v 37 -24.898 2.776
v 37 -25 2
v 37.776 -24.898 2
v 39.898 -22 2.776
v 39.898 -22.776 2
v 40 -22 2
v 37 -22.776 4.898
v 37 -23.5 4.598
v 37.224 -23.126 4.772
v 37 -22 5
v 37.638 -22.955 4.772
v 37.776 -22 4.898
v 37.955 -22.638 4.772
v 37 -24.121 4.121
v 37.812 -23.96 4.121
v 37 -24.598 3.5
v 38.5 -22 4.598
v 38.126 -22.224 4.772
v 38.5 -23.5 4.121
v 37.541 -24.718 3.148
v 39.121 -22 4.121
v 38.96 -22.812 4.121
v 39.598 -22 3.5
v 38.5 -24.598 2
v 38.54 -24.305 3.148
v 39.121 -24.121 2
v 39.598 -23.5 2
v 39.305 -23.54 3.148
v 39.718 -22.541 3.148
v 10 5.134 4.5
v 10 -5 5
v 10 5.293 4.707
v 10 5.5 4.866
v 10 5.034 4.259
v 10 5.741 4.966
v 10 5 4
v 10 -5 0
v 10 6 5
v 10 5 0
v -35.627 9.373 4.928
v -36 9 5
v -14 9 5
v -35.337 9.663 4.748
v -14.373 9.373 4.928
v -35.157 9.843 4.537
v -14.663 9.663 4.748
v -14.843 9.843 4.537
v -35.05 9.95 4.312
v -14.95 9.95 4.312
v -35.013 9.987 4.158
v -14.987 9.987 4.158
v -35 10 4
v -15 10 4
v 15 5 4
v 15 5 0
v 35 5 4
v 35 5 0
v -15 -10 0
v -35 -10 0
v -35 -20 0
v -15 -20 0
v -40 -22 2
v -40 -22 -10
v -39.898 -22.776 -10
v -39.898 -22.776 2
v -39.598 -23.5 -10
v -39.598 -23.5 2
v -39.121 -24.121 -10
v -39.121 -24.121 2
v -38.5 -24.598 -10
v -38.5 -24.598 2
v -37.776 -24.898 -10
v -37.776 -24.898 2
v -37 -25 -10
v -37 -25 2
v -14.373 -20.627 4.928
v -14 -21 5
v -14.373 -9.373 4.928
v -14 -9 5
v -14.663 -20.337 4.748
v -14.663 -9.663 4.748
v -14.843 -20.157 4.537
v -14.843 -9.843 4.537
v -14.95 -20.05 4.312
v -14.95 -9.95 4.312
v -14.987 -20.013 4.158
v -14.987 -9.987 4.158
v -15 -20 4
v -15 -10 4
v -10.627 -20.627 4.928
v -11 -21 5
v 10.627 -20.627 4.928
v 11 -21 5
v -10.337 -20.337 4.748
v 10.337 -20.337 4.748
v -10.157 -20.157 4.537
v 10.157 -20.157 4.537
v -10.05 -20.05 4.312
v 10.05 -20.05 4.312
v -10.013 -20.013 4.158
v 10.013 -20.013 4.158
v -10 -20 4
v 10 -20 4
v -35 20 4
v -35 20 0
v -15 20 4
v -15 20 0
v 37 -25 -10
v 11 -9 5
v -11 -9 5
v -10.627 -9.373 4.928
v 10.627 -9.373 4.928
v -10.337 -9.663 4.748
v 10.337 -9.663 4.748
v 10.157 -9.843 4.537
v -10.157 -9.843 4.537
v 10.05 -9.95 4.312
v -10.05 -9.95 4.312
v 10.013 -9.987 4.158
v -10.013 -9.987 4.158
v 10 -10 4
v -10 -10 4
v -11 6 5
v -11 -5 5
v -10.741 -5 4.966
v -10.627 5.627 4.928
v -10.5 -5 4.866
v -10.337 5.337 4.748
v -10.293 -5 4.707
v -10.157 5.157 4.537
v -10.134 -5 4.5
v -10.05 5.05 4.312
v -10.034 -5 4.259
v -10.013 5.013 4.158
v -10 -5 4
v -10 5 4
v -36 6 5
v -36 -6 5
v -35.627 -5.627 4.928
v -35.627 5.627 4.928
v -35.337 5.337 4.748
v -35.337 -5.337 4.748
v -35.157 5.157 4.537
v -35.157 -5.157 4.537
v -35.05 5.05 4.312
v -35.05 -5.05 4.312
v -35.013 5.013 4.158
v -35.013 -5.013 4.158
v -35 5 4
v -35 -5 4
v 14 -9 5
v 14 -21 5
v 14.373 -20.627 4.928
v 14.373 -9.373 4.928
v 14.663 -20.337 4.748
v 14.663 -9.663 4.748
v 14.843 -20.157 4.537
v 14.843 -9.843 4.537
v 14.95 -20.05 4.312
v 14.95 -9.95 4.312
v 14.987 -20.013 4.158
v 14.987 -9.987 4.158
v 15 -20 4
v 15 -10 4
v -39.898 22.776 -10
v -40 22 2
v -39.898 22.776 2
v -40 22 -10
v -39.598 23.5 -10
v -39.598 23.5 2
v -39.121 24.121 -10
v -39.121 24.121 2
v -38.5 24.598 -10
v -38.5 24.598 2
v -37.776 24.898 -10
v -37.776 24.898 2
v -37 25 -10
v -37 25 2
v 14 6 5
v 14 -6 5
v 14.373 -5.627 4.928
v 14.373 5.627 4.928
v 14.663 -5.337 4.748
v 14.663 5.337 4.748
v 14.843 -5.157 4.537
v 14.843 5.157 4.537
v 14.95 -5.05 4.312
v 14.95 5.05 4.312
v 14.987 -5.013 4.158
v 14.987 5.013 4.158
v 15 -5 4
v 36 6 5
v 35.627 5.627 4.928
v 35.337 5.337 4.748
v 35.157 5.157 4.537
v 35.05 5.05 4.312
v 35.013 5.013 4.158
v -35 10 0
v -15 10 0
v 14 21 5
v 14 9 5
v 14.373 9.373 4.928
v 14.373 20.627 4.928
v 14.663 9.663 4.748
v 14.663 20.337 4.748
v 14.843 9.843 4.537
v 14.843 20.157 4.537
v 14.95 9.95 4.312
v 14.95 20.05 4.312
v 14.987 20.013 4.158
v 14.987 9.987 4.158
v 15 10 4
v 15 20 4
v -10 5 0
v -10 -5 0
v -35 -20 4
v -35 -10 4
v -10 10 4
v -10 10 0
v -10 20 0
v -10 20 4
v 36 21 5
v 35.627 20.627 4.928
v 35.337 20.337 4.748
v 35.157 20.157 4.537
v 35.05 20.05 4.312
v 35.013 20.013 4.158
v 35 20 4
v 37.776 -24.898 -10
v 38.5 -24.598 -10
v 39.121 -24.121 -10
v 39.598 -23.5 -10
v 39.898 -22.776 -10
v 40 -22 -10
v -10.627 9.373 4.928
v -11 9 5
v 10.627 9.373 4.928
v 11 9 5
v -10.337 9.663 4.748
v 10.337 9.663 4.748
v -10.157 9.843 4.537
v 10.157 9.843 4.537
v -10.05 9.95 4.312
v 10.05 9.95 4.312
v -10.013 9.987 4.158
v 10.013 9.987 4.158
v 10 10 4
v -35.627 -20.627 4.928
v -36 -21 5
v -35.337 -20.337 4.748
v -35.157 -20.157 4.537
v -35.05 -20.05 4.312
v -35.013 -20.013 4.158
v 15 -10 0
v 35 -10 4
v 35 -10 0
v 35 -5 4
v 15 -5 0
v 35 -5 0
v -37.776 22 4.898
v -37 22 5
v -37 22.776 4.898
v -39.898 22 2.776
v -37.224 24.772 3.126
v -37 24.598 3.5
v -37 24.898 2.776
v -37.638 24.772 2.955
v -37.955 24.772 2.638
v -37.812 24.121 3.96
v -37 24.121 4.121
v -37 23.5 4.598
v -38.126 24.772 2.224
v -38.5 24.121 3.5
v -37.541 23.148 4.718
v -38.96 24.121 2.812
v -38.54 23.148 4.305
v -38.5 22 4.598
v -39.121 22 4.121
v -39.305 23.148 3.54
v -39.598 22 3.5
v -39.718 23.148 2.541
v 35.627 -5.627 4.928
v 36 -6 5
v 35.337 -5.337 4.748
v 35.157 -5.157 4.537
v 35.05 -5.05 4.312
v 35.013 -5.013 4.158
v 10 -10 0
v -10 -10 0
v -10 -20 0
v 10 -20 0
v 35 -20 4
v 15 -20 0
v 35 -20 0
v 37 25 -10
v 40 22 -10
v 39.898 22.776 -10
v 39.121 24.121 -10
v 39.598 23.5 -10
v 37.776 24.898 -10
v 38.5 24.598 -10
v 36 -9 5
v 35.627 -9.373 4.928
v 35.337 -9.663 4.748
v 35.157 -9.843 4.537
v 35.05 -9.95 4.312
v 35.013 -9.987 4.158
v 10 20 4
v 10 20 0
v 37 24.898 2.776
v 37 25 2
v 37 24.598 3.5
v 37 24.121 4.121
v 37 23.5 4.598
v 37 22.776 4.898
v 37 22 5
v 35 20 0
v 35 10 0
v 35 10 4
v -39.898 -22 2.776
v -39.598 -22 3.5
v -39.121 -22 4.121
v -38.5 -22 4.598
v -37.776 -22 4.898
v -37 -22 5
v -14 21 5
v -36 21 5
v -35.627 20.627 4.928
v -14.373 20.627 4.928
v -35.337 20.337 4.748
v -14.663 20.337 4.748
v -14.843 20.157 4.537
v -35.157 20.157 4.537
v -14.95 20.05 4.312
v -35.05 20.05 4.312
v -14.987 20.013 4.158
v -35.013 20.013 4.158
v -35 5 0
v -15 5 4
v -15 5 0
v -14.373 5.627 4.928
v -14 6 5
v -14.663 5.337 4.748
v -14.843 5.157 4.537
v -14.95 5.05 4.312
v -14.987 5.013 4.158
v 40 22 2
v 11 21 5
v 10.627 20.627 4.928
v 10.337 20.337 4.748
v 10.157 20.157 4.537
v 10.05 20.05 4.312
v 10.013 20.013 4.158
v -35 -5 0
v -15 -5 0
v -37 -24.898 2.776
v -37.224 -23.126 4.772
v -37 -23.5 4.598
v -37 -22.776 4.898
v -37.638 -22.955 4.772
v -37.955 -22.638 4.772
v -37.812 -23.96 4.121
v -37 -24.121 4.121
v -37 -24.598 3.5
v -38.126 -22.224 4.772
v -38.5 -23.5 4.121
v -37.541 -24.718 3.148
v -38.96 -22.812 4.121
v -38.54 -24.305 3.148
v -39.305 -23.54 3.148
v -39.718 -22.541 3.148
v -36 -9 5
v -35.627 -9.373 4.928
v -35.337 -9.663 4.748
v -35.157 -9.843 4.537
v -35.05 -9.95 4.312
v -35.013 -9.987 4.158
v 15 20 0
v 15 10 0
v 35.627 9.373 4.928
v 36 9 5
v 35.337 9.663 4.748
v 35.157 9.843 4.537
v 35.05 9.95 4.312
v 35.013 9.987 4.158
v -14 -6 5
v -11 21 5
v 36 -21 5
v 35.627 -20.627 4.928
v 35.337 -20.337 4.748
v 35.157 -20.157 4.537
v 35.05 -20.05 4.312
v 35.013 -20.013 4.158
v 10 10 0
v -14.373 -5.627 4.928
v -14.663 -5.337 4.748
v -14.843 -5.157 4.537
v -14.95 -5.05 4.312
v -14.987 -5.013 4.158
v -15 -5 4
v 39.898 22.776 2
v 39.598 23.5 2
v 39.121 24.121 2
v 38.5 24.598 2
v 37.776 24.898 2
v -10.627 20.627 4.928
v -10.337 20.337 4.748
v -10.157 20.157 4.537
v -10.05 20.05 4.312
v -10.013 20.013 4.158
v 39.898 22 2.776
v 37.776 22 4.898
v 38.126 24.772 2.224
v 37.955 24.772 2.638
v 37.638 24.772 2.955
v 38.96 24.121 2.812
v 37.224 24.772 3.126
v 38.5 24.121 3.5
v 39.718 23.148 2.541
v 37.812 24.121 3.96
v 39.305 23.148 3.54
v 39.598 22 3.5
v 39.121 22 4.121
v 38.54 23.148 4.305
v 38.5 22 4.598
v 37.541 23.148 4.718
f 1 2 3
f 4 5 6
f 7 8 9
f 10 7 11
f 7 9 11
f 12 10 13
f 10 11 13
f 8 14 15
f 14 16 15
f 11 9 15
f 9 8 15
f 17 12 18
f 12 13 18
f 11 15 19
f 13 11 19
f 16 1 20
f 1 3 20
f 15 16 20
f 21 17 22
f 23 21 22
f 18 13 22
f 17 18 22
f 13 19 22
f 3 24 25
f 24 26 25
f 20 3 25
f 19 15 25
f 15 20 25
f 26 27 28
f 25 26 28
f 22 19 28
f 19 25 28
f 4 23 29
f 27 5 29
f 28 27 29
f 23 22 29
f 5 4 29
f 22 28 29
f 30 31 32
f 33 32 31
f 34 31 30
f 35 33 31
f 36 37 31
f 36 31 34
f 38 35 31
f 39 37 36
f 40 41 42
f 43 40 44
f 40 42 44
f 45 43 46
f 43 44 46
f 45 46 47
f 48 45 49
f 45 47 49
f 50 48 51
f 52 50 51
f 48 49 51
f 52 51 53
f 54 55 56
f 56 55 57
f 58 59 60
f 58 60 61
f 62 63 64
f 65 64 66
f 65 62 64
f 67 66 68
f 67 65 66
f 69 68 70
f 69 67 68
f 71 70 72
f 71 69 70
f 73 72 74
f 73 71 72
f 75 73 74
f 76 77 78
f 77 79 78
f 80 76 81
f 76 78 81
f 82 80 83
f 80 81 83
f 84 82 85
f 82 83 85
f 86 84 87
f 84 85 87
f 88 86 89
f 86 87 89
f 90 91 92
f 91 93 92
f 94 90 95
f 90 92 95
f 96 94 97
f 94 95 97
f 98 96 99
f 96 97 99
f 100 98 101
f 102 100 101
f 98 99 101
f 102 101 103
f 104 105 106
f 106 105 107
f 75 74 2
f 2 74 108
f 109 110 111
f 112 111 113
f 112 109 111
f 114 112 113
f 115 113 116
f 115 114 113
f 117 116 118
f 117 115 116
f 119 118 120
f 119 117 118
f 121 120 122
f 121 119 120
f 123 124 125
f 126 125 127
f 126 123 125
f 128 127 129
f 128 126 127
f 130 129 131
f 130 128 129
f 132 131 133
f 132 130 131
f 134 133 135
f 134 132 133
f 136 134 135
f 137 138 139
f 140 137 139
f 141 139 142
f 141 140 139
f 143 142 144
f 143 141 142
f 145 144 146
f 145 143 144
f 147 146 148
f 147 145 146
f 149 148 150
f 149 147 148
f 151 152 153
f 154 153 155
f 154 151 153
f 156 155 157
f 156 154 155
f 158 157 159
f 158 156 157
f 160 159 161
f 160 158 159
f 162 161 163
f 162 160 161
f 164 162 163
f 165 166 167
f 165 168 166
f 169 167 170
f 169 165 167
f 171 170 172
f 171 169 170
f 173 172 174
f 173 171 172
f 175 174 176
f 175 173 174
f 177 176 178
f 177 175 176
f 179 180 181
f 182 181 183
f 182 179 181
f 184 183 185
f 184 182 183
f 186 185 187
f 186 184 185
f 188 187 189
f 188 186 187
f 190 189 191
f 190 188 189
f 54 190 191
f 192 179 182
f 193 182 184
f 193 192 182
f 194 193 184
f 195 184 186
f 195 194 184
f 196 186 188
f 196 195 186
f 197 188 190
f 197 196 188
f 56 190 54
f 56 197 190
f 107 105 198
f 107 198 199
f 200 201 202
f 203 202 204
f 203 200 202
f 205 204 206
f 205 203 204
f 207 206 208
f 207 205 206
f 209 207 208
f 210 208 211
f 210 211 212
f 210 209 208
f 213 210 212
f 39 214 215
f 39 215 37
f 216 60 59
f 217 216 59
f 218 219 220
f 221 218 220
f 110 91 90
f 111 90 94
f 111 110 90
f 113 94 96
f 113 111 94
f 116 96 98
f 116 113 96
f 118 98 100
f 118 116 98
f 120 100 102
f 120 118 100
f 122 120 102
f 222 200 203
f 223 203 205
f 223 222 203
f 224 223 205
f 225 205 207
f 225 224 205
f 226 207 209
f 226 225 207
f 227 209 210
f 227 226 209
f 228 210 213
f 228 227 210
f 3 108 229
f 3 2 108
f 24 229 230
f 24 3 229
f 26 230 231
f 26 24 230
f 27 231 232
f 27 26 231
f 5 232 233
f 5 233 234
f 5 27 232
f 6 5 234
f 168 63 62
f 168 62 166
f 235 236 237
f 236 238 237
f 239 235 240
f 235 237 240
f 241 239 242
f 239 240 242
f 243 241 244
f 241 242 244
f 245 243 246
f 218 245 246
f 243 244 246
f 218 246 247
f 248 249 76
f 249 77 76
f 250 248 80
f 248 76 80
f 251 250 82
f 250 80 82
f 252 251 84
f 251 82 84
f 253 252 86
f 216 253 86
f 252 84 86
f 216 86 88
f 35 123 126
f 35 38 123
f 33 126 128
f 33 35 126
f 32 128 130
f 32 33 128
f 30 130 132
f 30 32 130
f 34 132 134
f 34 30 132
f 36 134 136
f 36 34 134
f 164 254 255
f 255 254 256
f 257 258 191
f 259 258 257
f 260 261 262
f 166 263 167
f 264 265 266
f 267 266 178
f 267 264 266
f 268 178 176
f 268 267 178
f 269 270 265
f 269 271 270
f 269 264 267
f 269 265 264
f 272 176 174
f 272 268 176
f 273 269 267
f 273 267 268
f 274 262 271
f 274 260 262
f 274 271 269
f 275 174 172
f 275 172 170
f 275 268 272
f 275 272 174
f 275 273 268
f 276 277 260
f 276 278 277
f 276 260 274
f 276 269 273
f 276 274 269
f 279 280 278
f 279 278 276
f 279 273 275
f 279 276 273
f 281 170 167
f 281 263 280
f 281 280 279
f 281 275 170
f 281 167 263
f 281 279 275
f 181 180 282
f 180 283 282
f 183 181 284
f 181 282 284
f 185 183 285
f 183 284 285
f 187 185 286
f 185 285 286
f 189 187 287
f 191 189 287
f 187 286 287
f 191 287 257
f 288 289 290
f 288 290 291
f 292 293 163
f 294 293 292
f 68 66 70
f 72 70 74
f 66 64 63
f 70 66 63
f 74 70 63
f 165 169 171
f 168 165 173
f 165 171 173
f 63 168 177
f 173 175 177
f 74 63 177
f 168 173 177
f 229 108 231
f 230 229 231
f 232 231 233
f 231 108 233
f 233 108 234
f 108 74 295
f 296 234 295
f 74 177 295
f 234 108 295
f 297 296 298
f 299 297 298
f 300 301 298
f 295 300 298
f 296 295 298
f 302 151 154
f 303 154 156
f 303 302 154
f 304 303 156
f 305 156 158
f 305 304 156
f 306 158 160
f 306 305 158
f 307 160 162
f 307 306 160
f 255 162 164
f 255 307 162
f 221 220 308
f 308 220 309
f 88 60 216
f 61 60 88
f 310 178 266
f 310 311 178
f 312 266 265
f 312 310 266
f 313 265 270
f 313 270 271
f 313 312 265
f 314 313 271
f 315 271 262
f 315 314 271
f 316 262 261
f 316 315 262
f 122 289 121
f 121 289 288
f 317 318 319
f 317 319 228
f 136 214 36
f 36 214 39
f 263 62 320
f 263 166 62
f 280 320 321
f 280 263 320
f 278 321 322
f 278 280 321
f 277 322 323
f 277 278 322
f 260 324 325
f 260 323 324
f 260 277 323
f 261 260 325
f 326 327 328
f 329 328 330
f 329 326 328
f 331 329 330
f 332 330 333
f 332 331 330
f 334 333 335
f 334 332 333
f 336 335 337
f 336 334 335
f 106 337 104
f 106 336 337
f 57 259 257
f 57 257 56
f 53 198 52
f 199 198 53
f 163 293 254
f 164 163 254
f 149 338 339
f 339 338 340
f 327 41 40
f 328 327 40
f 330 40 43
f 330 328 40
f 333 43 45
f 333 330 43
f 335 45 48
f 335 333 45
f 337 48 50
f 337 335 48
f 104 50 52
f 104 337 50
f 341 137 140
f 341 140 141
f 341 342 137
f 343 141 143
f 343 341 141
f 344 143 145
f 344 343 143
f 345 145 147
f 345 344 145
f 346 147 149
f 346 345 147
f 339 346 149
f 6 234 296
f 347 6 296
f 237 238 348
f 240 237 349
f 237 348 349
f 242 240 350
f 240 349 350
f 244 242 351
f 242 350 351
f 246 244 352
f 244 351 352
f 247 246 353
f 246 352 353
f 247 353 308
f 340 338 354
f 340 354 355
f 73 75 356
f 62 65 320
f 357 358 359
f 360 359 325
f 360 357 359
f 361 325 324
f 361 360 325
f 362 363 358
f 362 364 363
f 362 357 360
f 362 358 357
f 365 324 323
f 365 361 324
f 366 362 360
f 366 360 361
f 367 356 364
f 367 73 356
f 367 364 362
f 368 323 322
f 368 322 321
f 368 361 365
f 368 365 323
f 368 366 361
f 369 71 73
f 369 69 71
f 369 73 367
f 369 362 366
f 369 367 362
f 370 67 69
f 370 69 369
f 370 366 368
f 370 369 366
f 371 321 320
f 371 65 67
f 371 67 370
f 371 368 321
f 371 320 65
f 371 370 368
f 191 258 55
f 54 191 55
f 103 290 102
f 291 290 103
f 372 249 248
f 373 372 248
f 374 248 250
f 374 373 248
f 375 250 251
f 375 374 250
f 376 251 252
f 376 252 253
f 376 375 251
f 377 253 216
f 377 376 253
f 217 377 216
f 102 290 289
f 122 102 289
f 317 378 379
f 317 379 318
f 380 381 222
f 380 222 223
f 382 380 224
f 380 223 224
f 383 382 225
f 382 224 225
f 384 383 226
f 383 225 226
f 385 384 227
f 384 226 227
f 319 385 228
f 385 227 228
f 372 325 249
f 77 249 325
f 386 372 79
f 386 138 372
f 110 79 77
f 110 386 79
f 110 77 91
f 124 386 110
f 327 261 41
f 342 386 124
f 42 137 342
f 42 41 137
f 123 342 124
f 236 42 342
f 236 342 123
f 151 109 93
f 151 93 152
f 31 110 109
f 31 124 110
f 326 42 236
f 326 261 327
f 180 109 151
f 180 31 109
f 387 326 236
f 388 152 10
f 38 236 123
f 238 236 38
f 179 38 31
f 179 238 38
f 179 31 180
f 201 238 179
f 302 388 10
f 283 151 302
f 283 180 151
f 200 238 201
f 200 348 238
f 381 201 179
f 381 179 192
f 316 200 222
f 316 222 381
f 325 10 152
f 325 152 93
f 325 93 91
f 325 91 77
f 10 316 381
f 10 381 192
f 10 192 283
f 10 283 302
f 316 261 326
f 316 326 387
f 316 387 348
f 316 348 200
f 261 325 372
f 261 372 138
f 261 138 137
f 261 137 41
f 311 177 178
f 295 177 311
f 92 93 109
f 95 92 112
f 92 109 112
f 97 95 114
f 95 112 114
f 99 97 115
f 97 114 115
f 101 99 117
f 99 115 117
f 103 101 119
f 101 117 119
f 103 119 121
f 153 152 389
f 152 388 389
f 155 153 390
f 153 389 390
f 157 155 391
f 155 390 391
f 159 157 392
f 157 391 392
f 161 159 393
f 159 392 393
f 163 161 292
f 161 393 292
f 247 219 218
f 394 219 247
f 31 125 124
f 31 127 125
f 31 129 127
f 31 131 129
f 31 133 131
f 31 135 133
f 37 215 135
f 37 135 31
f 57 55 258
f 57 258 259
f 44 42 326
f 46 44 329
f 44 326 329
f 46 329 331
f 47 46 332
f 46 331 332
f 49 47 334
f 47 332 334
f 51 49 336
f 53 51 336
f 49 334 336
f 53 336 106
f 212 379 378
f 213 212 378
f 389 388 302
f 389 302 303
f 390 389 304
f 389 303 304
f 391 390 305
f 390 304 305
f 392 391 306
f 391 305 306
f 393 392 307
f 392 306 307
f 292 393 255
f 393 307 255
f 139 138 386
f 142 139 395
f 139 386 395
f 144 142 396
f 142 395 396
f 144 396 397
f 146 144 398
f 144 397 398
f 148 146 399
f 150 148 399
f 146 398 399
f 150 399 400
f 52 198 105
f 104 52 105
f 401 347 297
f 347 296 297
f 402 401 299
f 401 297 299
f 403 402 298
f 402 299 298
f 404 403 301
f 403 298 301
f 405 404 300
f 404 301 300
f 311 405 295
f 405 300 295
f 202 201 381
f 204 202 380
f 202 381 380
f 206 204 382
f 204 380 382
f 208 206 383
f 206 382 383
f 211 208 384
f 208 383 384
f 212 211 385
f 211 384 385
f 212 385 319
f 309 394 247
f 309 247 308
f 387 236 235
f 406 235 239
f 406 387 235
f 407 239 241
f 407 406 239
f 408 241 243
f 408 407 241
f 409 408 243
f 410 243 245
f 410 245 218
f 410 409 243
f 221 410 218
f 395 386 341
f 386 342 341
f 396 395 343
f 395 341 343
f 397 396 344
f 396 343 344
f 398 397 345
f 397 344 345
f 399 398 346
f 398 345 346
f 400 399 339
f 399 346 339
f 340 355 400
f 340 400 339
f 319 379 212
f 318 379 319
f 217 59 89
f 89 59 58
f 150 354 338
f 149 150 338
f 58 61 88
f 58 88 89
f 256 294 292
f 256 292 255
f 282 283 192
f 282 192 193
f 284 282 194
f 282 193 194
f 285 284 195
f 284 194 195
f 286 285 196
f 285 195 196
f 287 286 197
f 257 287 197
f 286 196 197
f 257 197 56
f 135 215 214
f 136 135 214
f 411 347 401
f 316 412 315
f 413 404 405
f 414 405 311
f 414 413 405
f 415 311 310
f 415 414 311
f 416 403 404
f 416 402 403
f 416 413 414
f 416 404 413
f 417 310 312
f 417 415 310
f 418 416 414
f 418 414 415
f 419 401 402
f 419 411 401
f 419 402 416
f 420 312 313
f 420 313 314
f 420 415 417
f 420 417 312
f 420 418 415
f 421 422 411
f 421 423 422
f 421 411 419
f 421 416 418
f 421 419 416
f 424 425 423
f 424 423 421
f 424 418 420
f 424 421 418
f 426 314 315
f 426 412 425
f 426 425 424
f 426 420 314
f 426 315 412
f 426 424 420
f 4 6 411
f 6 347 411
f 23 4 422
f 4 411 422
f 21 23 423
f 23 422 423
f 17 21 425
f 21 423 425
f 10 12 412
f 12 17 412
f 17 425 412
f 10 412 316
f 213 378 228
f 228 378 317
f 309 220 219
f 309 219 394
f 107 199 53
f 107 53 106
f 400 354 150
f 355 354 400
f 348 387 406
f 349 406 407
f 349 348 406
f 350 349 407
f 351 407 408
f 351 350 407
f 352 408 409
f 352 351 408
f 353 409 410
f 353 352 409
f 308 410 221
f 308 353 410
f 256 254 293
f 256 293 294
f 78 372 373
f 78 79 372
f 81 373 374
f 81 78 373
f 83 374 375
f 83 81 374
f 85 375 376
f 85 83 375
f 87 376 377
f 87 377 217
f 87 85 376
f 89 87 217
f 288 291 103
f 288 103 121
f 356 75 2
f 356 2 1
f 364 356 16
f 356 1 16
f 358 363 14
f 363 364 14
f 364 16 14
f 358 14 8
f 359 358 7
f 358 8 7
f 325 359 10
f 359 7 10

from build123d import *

# Parameters (mm, degrees)
F0_W     = 80
F0_H     = 50
F0_W_2   = 20
F0_H_2   = 10
F1_DEPTH = 10
F2_DEPTH = 5
F3_R     = 3
F4_R     = 1


with BuildPart() as f1:
    # F0 (on Top) → F1 (new body)
    with BuildSketch(Plane.XY):
        Rectangle(F0_W, F0_H)
        with Locations((-25, -15)):
            Rectangle(F0_W_2, F0_H_2, mode=Mode.SUBTRACT)
        with Locations((0, -15)):
            Rectangle(F0_W_2, F0_H_2, mode=Mode.SUBTRACT)
        with Locations((25, -15)):
            Rectangle(F0_W_2, F0_H_2, mode=Mode.SUBTRACT)
        with Locations((-25, 0)):
            Rectangle(F0_W_2, F0_H_2, mode=Mode.SUBTRACT)
        with Locations((-25, 15)):
            Rectangle(F0_W_2, F0_H_2, mode=Mode.SUBTRACT)
        Rectangle(F0_W_2, F0_H_2, mode=Mode.SUBTRACT)
        with Locations((25, 0)):
            Rectangle(F0_W_2, F0_H_2, mode=Mode.SUBTRACT)
        with Locations((0, 15)):
            Rectangle(F0_W_2, F0_H_2, mode=Mode.SUBTRACT)
        with Locations((25, 15)):
            Rectangle(F0_W_2, F0_H_2, mode=Mode.SUBTRACT)
        with Locations((-25, 15)):
            Rectangle(F0_W_2, F0_H_2)
        with Locations((0, 15)):
            Rectangle(F0_W_2, F0_H_2)
        with Locations((25, 15)):
            Rectangle(F0_W_2, F0_H_2)
        with Locations((25, 0)):
            Rectangle(F0_W_2, F0_H_2)
        Rectangle(F0_W_2, F0_H_2)
        with Locations((-25, 0)):
            Rectangle(F0_W_2, F0_H_2)
        with Locations((-25, -15)):
            Rectangle(F0_W_2, F0_H_2)
        with Locations((0, -15)):
            Rectangle(F0_W_2, F0_H_2)
        with Locations((25, -15)):
            Rectangle(F0_W_2, F0_H_2)
    extrude(amount=-F1_DEPTH)

    # F0 (on Top) → F2 (join)
    with BuildSketch(Plane.XY):
        Rectangle(F0_W, F0_H)
        with Locations((-25, -15)):
            Rectangle(F0_W_2, F0_H_2, mode=Mode.SUBTRACT)
        with Locations((0, -15)):
            Rectangle(F0_W_2, F0_H_2, mode=Mode.SUBTRACT)
        with Locations((25, -15)):
            Rectangle(F0_W_2, F0_H_2, mode=Mode.SUBTRACT)
        with Locations((-25, 0)):
            Rectangle(F0_W_2, F0_H_2, mode=Mode.SUBTRACT)
        with Locations((-25, 15)):
            Rectangle(F0_W_2, F0_H_2, mode=Mode.SUBTRACT)
        Rectangle(F0_W_2, F0_H_2, mode=Mode.SUBTRACT)
        with Locations((25, 0)):
            Rectangle(F0_W_2, F0_H_2, mode=Mode.SUBTRACT)
        with Locations((0, 15)):
            Rectangle(F0_W_2, F0_H_2, mode=Mode.SUBTRACT)
        with Locations((25, 15)):
            Rectangle(F0_W_2, F0_H_2, mode=Mode.SUBTRACT)
    extrude(amount=F2_DEPTH)

    # F3
    f3_edges = [f1.edges().sort_by_distance(p)[0] for p in [
        (-40, -25, -2.5),
        (40, -25, -2.5),
        (0, -25, 5),
        (-40, 0, 5),
        (40, 0, 5),
        (40, 25, -2.5),
        (0, 25, 5),
        (-40, 25, -2.5),
    ]]
    fillet(f3_edges, radius=F3_R)

    # F4
    f4_edges = [f1.edges().sort_by_distance(p)[0] for p in [
        (-15, -15, 5),
        (-25, -10, 5),
        (-35, -15, 5),
        (-25, -20, 5),
        (-15, 0, 5),
        (-25, -5, 5),
        (-35, 0, 5),
        (-25, 5, 5),
        (-25, 20, 5),
        (-15, 15, 5),
        (-25, 10, 5),
        (-35, 15, 5),
        (-10, 15, 5),
        (0, 20, 5),
        (0, 10, 5),
        (10, 15, 5),
        (0, 5, 5),
        (-10, 0, 5),
        (-10, -15, 5),
        (0, -10, 5),
        (0, -20, 5),
        (10, -15, 5),
        (15, 0, 5),
        (25, 5, 5),
        (15, 15, 5),
        (25, 20, 5),
        (25, -5, 5),
        (15, -15, 5),
        (25, -10, 5),
        (25, -20, 5),
        (35, -15, 5),
        (35, 0, 5),
        (35, 15, 5),
        (25, 10, 5),
    ]]
    fillet(f4_edges, radius=F4_R)


solid = f1.part
